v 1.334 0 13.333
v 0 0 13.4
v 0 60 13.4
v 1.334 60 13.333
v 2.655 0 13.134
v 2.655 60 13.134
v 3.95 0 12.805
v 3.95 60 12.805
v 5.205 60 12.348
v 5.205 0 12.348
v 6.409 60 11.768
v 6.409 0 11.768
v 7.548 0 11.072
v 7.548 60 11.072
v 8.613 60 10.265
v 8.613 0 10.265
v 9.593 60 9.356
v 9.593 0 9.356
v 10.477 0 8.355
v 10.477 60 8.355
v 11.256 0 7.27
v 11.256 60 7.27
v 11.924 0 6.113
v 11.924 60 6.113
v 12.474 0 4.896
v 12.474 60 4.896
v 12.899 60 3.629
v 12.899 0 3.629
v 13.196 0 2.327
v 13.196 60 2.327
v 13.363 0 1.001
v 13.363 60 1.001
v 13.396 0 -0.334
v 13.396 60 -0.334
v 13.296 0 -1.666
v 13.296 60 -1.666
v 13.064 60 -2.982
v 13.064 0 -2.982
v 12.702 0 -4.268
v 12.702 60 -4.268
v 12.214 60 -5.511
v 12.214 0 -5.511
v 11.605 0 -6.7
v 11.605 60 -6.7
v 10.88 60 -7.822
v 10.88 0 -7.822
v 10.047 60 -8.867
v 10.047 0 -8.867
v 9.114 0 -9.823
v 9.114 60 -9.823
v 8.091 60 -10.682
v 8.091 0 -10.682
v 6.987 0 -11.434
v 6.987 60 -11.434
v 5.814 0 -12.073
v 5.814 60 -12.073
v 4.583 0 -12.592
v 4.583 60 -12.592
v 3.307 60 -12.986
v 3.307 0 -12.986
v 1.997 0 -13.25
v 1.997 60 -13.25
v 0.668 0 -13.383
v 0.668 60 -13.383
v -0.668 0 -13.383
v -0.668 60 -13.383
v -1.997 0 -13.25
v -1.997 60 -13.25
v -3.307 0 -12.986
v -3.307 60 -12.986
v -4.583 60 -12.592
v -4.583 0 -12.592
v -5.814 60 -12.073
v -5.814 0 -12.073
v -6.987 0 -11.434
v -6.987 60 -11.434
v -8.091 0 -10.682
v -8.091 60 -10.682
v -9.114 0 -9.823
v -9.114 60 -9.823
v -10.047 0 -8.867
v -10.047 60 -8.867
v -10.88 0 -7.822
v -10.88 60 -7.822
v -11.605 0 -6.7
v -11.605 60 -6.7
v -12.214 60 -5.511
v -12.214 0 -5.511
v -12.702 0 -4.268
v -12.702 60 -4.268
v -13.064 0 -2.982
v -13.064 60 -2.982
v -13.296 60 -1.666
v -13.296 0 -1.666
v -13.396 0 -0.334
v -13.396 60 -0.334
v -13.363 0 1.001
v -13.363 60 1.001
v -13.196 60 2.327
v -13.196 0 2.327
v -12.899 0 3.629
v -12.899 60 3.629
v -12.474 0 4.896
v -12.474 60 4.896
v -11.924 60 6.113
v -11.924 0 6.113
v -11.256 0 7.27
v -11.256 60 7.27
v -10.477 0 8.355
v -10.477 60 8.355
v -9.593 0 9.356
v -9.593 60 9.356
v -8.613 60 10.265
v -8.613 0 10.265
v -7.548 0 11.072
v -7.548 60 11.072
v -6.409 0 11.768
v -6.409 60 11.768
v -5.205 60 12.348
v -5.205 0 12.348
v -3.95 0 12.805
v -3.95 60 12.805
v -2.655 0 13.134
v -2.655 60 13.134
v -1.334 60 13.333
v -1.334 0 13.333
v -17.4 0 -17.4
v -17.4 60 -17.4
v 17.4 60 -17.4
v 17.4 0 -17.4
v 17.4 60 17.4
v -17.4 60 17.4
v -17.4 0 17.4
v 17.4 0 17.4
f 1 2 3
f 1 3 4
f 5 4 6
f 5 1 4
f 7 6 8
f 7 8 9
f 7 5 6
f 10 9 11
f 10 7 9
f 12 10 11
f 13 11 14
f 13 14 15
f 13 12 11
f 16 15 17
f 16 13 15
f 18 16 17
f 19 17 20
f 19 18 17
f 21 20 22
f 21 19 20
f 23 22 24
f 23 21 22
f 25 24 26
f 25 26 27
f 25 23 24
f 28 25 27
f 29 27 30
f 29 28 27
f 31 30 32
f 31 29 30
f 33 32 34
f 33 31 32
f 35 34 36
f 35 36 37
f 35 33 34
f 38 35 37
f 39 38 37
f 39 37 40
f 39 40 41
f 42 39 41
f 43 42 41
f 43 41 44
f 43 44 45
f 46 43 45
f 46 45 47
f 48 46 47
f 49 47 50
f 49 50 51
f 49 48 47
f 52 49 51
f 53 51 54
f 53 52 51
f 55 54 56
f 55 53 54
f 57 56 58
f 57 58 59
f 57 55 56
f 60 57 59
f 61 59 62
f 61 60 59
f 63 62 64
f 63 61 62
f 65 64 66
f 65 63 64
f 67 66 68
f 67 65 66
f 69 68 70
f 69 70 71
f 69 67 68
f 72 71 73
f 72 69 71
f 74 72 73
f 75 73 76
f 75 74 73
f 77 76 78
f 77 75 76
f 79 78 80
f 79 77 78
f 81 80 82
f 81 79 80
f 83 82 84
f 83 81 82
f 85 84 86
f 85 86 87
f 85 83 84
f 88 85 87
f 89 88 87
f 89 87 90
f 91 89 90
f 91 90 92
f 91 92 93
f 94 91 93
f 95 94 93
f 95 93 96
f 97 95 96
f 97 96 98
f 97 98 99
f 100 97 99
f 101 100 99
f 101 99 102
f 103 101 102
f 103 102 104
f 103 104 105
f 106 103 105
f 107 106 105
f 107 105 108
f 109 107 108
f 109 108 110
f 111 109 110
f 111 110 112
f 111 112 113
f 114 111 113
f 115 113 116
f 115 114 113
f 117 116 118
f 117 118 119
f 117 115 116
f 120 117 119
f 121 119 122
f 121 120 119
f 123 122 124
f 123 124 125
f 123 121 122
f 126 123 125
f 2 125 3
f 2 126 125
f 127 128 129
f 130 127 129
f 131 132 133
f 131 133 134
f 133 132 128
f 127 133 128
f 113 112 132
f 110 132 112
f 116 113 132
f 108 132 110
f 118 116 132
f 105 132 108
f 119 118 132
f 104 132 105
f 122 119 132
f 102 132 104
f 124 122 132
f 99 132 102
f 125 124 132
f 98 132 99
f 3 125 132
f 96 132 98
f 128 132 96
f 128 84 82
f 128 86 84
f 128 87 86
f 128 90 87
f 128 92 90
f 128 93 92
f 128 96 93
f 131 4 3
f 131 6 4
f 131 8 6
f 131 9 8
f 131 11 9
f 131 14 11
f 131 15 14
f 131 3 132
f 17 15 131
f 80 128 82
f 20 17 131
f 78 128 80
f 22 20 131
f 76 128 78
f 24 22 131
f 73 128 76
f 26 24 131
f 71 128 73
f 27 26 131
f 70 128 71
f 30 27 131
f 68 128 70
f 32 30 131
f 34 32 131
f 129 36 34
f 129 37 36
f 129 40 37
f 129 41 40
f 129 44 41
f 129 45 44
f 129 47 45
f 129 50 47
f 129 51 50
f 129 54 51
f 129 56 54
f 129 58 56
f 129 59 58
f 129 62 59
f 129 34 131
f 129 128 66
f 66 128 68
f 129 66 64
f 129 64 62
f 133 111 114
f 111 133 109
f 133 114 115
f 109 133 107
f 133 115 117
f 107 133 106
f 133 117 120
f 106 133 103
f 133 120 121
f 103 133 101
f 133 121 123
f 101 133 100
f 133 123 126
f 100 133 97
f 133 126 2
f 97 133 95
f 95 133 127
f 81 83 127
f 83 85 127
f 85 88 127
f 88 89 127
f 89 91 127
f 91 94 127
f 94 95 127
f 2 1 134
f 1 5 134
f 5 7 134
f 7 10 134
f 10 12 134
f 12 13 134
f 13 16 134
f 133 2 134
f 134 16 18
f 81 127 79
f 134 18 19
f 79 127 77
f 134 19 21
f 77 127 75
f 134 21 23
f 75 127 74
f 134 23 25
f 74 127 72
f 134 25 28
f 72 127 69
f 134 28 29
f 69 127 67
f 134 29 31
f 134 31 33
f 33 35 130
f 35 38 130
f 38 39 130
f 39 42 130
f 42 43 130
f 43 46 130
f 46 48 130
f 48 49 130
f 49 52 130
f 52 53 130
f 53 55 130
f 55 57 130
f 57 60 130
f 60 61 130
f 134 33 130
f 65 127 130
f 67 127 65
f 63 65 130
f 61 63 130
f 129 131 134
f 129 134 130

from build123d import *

# Parameters (mm, degrees)
SKETCH1_W           = 34.8
SKETCH1_H           = 34.8
SKETCH1_R           = 13.4
BOSS_EXTRUDE1_DEPTH = 60


with BuildPart() as part:
    # Sketch1 → Boss-Extrude1 (new body)
    with BuildSketch(Plane(origin=(0, 0, 0), x_dir=(1, 0, 0), z_dir=(0, 1, 0))):
        Rectangle(SKETCH1_W, SKETCH1_H)
        with Locations(Location((0, 0, 0), (0, 0, 270))):
            Circle(SKETCH1_R, mode=Mode.SUBTRACT)
    boss_extrude1 = extrude(amount=BOSS_EXTRUDE1_DEPTH)


with BuildPart() as mirror2_1:
    # Mirror2: Boss-Extrude1 across Right Plane
    add(boss_extrude1.mirror(Plane(origin=(0, 0, 0), x_dir=(0, 0, -1), z_dir=(1, 0, 0))))


with BuildPart() as part_1:
    add(part.part)

    # Mirror2 united with what the copies touc: union Mirror2_1
    add(mirror2_1.part)


solid = part_1.part
